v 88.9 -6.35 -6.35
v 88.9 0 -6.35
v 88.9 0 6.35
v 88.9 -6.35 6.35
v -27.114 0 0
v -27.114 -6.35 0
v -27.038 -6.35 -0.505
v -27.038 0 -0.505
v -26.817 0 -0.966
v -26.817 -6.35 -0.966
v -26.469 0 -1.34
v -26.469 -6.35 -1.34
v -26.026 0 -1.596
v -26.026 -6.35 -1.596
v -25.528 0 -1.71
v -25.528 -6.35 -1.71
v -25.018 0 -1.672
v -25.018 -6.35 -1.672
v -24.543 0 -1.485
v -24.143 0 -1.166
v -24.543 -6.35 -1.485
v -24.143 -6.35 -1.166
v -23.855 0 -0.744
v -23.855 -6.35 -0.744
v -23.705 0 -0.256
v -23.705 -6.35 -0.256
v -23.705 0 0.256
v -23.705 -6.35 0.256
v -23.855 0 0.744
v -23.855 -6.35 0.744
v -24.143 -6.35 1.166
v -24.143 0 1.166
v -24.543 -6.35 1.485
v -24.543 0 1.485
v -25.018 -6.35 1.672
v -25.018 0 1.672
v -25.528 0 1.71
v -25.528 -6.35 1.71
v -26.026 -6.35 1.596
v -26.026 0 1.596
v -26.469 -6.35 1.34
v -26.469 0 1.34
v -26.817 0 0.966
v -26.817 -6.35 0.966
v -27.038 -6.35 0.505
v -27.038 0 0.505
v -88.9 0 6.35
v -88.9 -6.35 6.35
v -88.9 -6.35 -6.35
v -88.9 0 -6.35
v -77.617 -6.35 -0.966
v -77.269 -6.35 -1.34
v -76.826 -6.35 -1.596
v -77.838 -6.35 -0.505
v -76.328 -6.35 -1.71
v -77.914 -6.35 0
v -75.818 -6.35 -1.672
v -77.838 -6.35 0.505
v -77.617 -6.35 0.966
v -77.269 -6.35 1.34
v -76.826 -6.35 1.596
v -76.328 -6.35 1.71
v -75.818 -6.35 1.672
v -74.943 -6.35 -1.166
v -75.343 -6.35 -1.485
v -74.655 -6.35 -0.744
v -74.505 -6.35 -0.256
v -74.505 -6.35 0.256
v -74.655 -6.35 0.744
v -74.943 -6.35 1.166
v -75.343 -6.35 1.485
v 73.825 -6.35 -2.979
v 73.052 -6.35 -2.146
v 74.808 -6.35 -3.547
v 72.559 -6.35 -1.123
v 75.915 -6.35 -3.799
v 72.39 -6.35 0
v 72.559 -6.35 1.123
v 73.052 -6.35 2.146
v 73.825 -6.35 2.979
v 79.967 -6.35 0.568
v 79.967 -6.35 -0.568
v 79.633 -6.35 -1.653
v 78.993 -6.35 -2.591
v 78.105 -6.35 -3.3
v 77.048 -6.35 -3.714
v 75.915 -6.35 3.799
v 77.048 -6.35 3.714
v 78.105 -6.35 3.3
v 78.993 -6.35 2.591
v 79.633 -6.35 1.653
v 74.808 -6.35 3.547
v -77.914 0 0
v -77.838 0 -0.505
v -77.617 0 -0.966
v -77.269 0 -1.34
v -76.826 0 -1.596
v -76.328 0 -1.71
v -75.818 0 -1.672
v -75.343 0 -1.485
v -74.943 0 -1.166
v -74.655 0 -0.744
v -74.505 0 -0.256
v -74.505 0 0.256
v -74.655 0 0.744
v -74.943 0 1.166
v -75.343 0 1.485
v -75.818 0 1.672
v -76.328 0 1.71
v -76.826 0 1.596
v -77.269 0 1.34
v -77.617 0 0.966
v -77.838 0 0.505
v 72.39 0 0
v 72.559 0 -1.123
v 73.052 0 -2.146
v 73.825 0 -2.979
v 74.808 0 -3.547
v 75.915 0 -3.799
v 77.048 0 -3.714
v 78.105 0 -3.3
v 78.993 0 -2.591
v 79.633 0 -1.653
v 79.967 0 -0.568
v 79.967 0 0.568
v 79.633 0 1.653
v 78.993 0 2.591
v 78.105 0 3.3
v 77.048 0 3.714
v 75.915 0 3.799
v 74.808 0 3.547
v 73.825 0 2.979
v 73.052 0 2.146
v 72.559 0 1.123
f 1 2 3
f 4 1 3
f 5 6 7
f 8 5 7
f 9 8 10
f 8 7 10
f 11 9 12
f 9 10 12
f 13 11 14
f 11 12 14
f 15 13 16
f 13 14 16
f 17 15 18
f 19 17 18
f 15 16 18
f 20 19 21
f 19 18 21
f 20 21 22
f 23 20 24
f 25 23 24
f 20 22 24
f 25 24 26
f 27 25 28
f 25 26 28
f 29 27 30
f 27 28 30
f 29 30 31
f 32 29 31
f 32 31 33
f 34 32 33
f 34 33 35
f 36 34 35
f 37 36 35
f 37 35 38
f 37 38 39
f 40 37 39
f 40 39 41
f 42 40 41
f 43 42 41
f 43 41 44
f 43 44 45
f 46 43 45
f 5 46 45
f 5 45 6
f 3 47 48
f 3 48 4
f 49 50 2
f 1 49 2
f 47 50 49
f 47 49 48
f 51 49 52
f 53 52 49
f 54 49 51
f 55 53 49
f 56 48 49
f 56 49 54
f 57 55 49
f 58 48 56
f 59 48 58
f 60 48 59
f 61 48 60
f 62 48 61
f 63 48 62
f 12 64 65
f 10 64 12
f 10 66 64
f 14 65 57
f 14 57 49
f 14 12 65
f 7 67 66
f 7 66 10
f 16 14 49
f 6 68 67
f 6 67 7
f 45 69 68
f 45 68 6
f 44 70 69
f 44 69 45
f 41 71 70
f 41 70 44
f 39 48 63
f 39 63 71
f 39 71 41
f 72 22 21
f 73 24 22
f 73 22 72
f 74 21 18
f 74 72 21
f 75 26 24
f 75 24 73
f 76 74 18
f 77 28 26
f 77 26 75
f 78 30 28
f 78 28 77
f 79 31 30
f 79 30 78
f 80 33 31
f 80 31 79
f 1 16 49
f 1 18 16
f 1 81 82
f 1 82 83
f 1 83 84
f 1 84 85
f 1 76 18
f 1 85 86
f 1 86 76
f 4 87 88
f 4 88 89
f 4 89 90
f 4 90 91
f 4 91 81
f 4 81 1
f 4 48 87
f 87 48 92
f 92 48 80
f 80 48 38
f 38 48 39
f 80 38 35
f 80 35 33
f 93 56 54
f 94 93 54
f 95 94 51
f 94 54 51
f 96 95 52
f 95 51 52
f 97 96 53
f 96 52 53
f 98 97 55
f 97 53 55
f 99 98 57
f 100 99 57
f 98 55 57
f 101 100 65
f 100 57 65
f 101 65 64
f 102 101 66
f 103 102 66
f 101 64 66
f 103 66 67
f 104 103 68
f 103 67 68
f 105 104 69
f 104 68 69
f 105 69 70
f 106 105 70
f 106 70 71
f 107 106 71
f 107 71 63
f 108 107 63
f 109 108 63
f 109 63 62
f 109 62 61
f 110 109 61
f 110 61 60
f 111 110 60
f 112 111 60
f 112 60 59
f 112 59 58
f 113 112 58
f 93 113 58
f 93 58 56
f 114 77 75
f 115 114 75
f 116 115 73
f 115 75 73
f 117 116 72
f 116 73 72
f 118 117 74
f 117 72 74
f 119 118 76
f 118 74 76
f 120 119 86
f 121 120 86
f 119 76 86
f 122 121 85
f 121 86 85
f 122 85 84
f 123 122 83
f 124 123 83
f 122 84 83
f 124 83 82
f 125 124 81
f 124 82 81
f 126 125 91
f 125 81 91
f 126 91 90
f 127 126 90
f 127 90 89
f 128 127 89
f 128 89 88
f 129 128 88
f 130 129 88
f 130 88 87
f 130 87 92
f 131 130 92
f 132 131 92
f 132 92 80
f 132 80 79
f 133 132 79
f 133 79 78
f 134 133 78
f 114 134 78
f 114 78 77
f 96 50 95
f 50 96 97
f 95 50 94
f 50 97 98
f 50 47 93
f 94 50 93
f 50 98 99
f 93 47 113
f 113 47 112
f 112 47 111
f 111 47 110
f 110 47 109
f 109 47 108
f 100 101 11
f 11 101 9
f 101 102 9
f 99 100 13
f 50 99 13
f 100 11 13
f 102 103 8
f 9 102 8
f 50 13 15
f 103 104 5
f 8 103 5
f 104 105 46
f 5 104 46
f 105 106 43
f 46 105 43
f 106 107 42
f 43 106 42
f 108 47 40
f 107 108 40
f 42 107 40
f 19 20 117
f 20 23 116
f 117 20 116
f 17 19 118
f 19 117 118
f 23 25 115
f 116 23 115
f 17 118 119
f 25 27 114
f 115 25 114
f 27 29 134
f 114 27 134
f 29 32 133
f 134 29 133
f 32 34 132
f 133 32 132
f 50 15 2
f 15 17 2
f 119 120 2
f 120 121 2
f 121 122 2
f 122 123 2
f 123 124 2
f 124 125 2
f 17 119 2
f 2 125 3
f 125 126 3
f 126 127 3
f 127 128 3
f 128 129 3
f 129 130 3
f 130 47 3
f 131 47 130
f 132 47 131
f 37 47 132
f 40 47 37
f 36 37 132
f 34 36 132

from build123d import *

# Parameters (mm, degrees)
F0_R     = 3.81
F1_DEPTH = 25.4
F0_W     = 177.8
F0_H     = 12.7
F0_R_2   = 1.27
F2_DEPTH = 6.35
F3_D     = 3.429
F4_D     = 7.62


with BuildPart() as f1:
    # F0 (on Front) → F1 (new body)
    with BuildSketch(Plane.XZ):
        with Locations((76.2, 0)):
            Circle(F0_R)
    extrude(amount=F1_DEPTH)

    # F0 (on Front) → F2 (join)
    with BuildSketch(Plane.XZ):
        Rectangle(F0_W, F0_H)
        with Locations((-76.2, 0)):
            Circle(F0_R_2, mode=Mode.SUBTRACT)
        with Locations((-25.4, 0)):
            Circle(F0_R_2, mode=Mode.SUBTRACT)
        with Locations((76.2, 0)):
            Circle(F0_R, mode=Mode.SUBTRACT)
        with Locations((-25.4, 0)):
            Circle(F0_R_2)
        with Locations((-76.2, 0)):
            Circle(F0_R_2)
    extrude(amount=F2_DEPTH)

    # F3 (through all)
    with Locations(Plane(origin=(0, 0, 0), x_dir=(1, 0, 0), z_dir=(0, 1, 0))):
        with Locations((-25.4, 0), (-76.2, 0)):
            Hole(F3_D / 2)

    # F4 (through all)
    with Locations(Plane(origin=(0, 0, 0), x_dir=(1, 0, 0), z_dir=(0, 1, 0))):
        with Locations((76.2, 0)):
            Hole(F4_D / 2)


solid = f1.part
